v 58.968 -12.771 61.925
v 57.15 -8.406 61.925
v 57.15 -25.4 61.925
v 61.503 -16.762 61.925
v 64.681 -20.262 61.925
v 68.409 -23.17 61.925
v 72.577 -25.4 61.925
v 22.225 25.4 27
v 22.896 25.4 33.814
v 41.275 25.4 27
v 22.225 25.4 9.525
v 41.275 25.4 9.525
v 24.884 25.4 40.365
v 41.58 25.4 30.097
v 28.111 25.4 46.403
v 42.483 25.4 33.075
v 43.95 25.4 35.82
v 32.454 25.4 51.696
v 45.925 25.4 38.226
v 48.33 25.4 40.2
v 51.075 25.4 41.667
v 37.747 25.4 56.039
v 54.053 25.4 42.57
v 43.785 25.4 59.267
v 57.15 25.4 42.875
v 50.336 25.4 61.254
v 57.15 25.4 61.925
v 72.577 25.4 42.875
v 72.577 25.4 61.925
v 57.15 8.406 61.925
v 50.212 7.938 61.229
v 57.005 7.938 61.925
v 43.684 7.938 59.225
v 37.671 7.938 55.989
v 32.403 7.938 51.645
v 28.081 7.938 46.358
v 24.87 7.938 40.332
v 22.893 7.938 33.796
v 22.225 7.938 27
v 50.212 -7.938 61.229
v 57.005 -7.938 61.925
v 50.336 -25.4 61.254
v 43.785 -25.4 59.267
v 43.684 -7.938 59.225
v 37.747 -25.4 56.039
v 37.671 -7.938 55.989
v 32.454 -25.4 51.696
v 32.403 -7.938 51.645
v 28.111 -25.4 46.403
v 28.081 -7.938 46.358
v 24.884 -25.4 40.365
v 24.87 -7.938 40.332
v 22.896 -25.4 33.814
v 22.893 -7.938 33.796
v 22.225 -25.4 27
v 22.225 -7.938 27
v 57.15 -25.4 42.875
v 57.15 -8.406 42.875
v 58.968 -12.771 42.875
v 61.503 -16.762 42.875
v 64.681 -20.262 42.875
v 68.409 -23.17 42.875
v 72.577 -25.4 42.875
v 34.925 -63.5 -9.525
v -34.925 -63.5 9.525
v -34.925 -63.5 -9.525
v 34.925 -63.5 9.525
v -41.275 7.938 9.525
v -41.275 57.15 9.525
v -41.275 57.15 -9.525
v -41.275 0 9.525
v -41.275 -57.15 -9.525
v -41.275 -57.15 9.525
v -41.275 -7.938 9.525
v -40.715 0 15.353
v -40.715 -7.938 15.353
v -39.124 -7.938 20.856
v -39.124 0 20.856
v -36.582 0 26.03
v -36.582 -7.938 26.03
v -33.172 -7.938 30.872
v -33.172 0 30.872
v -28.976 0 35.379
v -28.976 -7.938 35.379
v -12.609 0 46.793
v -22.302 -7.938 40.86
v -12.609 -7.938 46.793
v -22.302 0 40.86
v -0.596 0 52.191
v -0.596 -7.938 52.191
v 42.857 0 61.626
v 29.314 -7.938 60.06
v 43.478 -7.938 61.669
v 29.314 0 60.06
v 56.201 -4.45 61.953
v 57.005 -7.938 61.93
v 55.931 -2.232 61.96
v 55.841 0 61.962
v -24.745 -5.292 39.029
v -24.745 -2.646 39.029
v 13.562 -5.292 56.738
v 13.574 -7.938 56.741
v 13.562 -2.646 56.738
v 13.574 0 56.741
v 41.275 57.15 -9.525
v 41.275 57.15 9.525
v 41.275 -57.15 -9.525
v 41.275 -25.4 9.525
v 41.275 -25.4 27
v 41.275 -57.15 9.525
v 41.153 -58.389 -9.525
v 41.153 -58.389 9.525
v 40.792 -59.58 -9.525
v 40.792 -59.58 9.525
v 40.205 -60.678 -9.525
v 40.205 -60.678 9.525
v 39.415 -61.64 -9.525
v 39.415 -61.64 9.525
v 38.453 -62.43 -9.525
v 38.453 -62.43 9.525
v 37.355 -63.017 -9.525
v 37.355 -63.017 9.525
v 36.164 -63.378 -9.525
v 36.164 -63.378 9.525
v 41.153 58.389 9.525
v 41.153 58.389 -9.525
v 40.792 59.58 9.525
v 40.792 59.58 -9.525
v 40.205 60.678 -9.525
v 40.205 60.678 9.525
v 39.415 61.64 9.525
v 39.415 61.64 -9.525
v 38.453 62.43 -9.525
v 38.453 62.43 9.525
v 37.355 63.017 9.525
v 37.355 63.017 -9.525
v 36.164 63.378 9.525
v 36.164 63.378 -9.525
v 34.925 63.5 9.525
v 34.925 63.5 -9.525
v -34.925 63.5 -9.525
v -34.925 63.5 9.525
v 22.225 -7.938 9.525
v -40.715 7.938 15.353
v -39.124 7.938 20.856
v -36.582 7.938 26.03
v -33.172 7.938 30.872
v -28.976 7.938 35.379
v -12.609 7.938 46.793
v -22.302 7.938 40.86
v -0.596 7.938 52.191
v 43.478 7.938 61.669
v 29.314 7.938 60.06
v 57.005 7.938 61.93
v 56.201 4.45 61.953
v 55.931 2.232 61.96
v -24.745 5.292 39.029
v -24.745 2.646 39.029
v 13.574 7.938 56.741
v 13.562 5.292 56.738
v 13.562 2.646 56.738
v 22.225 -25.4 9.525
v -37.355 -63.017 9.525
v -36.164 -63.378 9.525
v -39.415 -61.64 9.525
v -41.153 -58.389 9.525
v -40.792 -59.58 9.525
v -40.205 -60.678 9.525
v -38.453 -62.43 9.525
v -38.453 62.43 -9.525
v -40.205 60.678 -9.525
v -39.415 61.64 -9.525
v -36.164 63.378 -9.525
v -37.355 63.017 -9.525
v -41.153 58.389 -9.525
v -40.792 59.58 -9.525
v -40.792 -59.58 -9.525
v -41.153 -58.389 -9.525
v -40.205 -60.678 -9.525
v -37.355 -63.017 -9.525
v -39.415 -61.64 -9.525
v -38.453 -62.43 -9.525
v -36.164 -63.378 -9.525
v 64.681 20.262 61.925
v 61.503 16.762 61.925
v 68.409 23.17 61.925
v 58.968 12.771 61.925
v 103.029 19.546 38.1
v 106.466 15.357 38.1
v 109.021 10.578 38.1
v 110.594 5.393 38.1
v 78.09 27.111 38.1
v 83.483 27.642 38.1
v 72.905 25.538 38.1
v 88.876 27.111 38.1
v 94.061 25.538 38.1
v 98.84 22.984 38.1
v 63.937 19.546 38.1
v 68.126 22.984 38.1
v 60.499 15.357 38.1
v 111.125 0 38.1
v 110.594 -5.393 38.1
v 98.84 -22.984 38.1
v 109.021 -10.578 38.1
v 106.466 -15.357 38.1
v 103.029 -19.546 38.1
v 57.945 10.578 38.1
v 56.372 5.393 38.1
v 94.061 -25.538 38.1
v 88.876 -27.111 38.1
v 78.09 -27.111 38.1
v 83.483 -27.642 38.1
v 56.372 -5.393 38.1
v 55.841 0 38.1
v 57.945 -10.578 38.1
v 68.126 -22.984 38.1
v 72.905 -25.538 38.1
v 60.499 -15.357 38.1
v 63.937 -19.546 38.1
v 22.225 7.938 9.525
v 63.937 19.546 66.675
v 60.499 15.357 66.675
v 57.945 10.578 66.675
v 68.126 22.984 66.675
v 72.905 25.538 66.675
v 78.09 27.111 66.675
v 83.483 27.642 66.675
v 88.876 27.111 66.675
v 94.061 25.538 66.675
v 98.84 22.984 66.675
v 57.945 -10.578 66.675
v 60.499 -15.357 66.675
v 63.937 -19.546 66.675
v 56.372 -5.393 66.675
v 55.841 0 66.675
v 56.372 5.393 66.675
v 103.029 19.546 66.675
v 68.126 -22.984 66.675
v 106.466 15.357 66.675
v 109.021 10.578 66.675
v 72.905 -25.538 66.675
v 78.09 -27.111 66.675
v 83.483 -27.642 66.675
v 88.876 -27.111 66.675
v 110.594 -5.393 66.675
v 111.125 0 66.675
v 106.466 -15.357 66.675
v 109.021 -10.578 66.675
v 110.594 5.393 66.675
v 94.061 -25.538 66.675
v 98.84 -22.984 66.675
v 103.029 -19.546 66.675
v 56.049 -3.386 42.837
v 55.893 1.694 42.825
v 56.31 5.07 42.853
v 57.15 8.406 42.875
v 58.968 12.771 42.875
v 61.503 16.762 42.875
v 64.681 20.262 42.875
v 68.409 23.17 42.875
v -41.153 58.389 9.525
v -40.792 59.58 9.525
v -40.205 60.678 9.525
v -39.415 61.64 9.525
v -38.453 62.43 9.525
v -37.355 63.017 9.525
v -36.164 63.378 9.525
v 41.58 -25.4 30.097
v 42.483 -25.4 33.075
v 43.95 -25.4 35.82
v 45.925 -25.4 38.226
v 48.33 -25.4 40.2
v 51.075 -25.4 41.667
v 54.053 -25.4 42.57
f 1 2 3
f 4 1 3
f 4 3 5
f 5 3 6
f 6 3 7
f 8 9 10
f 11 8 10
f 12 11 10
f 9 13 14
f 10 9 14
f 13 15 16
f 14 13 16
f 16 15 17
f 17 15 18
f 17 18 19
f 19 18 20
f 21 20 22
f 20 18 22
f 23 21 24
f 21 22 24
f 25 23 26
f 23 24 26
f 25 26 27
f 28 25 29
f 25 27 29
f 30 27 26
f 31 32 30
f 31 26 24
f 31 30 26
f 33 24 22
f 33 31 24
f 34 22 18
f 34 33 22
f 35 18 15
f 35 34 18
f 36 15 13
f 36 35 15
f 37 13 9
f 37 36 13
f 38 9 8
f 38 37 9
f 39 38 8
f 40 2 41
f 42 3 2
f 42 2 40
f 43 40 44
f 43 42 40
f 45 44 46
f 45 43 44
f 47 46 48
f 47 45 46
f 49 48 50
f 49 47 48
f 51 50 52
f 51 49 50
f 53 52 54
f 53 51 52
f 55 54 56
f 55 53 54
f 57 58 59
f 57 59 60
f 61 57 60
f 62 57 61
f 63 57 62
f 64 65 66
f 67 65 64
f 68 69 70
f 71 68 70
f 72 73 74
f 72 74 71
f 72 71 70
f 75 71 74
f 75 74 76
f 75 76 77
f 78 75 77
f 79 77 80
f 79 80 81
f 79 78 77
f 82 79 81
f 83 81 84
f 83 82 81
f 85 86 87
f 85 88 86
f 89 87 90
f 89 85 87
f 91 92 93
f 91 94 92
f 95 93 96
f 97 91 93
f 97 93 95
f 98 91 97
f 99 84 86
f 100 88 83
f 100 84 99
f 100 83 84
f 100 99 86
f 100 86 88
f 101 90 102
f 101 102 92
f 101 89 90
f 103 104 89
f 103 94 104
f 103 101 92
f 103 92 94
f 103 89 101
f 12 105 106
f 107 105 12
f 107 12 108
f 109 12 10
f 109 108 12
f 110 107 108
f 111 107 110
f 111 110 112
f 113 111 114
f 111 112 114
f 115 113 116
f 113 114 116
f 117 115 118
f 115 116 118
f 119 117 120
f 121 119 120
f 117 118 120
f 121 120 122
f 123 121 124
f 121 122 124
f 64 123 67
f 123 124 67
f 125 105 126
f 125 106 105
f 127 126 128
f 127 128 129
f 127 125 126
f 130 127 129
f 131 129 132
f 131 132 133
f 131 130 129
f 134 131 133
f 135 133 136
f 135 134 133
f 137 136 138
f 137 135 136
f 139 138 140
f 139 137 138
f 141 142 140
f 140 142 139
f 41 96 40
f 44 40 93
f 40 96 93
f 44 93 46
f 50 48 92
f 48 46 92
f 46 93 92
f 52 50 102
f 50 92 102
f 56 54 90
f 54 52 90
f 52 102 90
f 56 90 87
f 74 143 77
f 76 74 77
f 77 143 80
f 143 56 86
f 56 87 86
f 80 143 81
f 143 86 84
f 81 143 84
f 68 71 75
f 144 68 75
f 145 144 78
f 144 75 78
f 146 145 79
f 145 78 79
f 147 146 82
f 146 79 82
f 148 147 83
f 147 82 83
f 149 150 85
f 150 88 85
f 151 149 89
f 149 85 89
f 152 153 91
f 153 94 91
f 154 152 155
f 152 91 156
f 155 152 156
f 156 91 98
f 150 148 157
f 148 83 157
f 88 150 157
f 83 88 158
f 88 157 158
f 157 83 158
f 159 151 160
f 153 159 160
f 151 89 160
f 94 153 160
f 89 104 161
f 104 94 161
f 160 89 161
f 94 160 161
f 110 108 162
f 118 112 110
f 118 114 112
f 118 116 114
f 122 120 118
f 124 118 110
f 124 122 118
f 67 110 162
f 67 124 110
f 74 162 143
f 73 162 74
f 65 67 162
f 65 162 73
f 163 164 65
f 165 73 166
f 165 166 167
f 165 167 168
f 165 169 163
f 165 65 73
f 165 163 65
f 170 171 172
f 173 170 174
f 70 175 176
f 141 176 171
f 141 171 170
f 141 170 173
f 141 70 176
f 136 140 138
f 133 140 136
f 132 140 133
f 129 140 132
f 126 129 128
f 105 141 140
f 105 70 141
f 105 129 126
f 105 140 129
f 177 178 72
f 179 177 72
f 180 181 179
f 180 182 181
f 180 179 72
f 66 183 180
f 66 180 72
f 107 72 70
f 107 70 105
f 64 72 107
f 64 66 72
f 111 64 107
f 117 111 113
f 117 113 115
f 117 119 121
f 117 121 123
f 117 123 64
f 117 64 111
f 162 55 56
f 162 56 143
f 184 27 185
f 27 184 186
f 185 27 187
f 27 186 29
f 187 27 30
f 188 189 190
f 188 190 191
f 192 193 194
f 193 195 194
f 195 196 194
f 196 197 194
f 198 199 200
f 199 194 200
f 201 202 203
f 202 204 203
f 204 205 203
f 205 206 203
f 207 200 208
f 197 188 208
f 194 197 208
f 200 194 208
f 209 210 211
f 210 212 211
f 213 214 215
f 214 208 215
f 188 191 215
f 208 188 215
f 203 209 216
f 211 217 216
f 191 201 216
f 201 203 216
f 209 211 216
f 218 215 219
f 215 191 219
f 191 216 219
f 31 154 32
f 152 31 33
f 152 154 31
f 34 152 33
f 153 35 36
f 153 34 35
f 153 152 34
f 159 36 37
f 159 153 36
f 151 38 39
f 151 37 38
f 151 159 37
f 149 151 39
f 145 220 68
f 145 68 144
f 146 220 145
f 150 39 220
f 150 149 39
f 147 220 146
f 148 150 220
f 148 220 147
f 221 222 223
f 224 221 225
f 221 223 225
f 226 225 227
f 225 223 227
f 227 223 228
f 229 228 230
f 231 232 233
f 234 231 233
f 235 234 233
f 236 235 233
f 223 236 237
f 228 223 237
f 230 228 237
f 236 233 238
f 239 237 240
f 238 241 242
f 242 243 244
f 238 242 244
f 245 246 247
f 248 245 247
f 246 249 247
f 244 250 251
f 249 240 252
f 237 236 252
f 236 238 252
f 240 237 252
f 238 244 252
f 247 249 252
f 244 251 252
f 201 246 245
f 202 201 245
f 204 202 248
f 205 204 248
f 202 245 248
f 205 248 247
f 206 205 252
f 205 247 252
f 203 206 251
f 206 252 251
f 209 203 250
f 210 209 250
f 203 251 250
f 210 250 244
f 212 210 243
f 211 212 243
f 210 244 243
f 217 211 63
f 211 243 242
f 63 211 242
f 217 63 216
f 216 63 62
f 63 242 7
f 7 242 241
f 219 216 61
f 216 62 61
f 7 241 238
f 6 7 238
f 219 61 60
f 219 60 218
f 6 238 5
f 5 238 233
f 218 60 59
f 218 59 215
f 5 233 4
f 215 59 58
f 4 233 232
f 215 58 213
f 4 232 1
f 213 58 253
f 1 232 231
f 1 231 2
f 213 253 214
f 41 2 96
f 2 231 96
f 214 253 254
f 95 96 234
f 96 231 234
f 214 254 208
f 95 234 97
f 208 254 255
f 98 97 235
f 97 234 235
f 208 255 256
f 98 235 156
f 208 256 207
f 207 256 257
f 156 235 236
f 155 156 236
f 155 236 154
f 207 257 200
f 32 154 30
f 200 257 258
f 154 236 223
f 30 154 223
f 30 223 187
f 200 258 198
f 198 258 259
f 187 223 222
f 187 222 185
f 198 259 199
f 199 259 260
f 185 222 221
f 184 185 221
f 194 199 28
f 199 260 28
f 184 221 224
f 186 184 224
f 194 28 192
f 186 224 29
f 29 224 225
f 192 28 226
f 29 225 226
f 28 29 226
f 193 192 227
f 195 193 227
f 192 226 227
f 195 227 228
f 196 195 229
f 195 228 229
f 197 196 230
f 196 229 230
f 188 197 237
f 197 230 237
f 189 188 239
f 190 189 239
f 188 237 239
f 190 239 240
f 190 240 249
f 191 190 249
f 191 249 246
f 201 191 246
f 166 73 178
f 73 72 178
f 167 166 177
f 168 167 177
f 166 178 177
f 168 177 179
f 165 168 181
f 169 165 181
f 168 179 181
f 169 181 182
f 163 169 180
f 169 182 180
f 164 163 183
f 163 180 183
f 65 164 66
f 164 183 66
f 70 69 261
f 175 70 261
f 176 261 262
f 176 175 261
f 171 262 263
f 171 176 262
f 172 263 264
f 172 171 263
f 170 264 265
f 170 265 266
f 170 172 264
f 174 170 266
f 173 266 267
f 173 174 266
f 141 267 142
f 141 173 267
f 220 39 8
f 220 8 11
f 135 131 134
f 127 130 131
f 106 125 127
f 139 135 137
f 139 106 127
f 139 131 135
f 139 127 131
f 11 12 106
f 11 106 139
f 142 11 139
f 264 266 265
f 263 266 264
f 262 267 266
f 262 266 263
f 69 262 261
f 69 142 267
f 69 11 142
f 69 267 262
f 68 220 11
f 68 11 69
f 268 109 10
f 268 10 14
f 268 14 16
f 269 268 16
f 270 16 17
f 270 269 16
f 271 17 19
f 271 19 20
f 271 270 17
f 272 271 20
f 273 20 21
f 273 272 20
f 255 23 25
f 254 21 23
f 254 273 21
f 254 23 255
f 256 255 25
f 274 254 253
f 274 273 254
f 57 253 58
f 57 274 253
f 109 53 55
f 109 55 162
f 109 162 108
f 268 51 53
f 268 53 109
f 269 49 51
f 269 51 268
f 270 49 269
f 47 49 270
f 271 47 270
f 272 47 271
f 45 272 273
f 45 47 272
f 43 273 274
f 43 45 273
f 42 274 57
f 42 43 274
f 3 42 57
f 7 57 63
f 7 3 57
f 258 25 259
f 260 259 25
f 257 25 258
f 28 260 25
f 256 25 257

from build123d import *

# Parameters (mm, degrees)
F1_DEPTH = 63.5
F2_DEPTH = 25.4
F0_W     = 23.1578589316
F0_H     = 19.05
F3_DEPTH = 25.4
F4_DEPTH = 7.9375
F6_R     = 6.35


with BuildPart() as f1:
    # F0 (on Front) → F1 (new body, symmetric)
    with BuildSketch(Plane.XZ):
        Polygon((-41.275, 9.525), (-41.275, -9.525), (41.275, -9.525), (41.275, 9.525), (22.225, 9.525), align=None)
    extrude(amount=F1_DEPTH, both=True)

    # F0 (on Front) → F2 (join, symmetric)
    with BuildSketch(Plane.XZ):
        with BuildLine():
            Line((22.225, 9.525), (41.275, 9.525))
            Line((41.275, 9.525), (41.275, 27.0002))
            ThreePointArc((41.275, 27.0002), (45.9246798487, 38.2255201513), (57.15, 42.8752))
            Line((57.15, 42.8752), (60.325, 42.8752))
            Line((60.325, 42.8752), (60.325, 61.9252))
            Line((60.325, 61.9252), (57.15, 61.9252))
            ThreePointArc((57.15, 61.9252), (32.4542956671, 51.6959043329), (22.225, 27.0002))
            Line((22.225, 27.0002), (22.225, 9.525))
        make_face()
    extrude(amount=F2_DEPTH, both=True)

    # F0 (on Front) → F3 (join, symmetric)
    with BuildSketch(Plane.XZ):
        with Locations((71.9039294658, 52.4002)):
            Rectangle(F0_W, F0_H)
    extrude(amount=F3_DEPTH, both=True)

    # F0 (on Front) → F4 (join, symmetric)
    with BuildSketch(Plane.XZ):
        with BuildLine():
            add(Edge.make_bspline(
                [(-41.275, 9.525), (-41.1813110113, 44.7291582823), (16.6801214218, 63.2801502943), (57.15, 61.9252)],
                knots=[0, 0, 0, 0, 111.5045361635, 111.5045361635, 111.5045361635, 111.5045361635], degree=3))
            Line((-41.275, 9.525), (22.225, 9.525))
            Line((22.225, 9.525), (22.225, 27.0002))
            ThreePointArc((22.225, 27.0002), (32.4542956671, 51.6959043329), (57.15, 61.9252))
        make_face()
    extrude(amount=F4_DEPTH, both=True)

    # F0 (on Front) → F5 (revolve)
    with BuildSketch(Plane.XZ):
        Polygon((83.4828589316, 66.675), (83.4828589316, 61.9252), (83.4828589316, 42.8752), (83.4828589316, 38.1), (111.125, 38.1), (111.125, 66.675), align=None)
    revolve(axis=Axis((83.4828589316, 0, 52.3875), (0, 0, -1)))

    # F6
    f6_edges = [f1.edges().sort_by_distance(p)[0] for p in [
        (-41.275, -63.5, 0),
        (41.275, -63.5, 0),
        (41.275, 63.5, 0),
        (-41.275, 63.5, 0),
    ]]
    fillet(f6_edges, radius=F6_R)


solid = f1.part
